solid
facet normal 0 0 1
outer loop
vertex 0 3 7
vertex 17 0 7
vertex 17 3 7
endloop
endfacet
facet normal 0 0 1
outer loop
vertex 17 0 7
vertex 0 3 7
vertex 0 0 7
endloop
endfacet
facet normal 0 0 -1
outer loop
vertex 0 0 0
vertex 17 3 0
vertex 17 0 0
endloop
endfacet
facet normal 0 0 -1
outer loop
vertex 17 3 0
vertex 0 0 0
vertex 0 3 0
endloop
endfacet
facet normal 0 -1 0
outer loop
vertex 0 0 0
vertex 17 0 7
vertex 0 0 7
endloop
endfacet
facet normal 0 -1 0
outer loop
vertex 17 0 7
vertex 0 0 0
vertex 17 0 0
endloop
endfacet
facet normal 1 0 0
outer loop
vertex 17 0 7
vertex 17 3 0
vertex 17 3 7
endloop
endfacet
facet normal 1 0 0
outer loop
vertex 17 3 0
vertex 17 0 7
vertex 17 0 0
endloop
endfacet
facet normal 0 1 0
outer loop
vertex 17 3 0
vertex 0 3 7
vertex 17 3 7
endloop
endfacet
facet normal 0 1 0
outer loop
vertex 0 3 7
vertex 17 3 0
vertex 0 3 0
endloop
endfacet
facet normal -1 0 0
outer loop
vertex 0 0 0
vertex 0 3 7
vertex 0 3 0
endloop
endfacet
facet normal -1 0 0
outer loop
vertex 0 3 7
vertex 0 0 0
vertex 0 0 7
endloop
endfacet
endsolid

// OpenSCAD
// Generated by SolidPython 1.0.1 on 2020-07-29 00:46:56


cube(size = [17, 3, 7]);
/***********************************************
*********      SolidPython code:      **********
************************************************
 
# import packages: SolidPython
from solid import *
from solid.utils import *
from itertools import chain, combinations, permutations


class Resize:

    def __init__(self, scad_file):
        self.scad_file = scad_file
        #self.scad_file = import_scad(scad_file)
        # cone/cylinder param:
        self.r1 = 0
        self.r2 = 0
        self.h = 0
        # rectangular prism param:
        self.w = 0
        self.l = 0
        # ellipse param:
        self.r = 0

    # import OpenScad code (file name corresponds to shape)


    # classify shape + parameters
    def assign(self, param1, param2, param3):
        if self.scad_file == 'cone.scad':
            self.r1 = param1
            self.r2 = param2
            self.h = param3
        elif self.scad_file == 'cylinder.scad':
            self.r1 = param1
            self.r2 = param2
            self.h = param3
        elif self.scad_file == 'rectangularPrism.scad':
            self.h = param1
            self.l = param2
            self.w = param3
        else:
            self.r = param1
            self.h = param2

    # resize parameters
    def iterate(self):
        x = range(3, 20, 2)
        i = 1
        if self.scad_file == 'cone.scad':
            tempList = list(permutations(x, 2))
            for temp in tempList:
                param1 = temp[0]
                param2 = temp[1]
                filepath = 'produced_scad_files/' + 'cone' + str(param1) + '_' + str(param2) + '_' + '.scad'
                scad_render_to_file(cylinder(h=param1, r1=param2, r2=0), filepath)

        elif self.scad_file == 'cylinder.scad':
            tempList = list(permutations(x, 3))
            for temp in tempList:
                param1 = temp[0]
                param2 = temp[1]
                filepath = 'produced_scad_files/' + 'cylinder' + str(param1) + '_' + str(param2) + '_' + '.scad'
                scad_render_to_file(cylinder(h=param1, r1=param2, r2=param2), filepath)

        elif self.scad_file == 'rectangularPrism.scad':
            tempList = list(permutations(x, 3))
            for temp in tempList:
                param1 = temp[0]
                param2 = temp[1]
                param3 = temp[2]
                filepath = 'produced_scad_files/' + 'rectangularPrism' + str(param1) + '_' + str(param2) + '_' + str(
                    param3) + '.scad'
                scad_render_to_file(cube(size=(param1, param2, param3)), filepath)

        elif self.scad_file == 'ellipse.scad':
            tempList = list(permutations(x, 4))
            for temp in tempList:
                param1 = temp[0]
                param2 = temp[1]
                param3 = temp[2]
                param4 = temp[3]
                filepath = 'produced_scad_files/' + 'ellipse' + str(param1) + '_' + str(param2) + '_' + str(param3) + '_' + str(param4) + '.scad'
                scad_render_to_file(scale([param1, param2, param3])(sphere(r=param4)), filepath)

    def render_to_scadfile(self):
        scad_render_to_file(scad, 'example.scad') 
 
************************************************/
